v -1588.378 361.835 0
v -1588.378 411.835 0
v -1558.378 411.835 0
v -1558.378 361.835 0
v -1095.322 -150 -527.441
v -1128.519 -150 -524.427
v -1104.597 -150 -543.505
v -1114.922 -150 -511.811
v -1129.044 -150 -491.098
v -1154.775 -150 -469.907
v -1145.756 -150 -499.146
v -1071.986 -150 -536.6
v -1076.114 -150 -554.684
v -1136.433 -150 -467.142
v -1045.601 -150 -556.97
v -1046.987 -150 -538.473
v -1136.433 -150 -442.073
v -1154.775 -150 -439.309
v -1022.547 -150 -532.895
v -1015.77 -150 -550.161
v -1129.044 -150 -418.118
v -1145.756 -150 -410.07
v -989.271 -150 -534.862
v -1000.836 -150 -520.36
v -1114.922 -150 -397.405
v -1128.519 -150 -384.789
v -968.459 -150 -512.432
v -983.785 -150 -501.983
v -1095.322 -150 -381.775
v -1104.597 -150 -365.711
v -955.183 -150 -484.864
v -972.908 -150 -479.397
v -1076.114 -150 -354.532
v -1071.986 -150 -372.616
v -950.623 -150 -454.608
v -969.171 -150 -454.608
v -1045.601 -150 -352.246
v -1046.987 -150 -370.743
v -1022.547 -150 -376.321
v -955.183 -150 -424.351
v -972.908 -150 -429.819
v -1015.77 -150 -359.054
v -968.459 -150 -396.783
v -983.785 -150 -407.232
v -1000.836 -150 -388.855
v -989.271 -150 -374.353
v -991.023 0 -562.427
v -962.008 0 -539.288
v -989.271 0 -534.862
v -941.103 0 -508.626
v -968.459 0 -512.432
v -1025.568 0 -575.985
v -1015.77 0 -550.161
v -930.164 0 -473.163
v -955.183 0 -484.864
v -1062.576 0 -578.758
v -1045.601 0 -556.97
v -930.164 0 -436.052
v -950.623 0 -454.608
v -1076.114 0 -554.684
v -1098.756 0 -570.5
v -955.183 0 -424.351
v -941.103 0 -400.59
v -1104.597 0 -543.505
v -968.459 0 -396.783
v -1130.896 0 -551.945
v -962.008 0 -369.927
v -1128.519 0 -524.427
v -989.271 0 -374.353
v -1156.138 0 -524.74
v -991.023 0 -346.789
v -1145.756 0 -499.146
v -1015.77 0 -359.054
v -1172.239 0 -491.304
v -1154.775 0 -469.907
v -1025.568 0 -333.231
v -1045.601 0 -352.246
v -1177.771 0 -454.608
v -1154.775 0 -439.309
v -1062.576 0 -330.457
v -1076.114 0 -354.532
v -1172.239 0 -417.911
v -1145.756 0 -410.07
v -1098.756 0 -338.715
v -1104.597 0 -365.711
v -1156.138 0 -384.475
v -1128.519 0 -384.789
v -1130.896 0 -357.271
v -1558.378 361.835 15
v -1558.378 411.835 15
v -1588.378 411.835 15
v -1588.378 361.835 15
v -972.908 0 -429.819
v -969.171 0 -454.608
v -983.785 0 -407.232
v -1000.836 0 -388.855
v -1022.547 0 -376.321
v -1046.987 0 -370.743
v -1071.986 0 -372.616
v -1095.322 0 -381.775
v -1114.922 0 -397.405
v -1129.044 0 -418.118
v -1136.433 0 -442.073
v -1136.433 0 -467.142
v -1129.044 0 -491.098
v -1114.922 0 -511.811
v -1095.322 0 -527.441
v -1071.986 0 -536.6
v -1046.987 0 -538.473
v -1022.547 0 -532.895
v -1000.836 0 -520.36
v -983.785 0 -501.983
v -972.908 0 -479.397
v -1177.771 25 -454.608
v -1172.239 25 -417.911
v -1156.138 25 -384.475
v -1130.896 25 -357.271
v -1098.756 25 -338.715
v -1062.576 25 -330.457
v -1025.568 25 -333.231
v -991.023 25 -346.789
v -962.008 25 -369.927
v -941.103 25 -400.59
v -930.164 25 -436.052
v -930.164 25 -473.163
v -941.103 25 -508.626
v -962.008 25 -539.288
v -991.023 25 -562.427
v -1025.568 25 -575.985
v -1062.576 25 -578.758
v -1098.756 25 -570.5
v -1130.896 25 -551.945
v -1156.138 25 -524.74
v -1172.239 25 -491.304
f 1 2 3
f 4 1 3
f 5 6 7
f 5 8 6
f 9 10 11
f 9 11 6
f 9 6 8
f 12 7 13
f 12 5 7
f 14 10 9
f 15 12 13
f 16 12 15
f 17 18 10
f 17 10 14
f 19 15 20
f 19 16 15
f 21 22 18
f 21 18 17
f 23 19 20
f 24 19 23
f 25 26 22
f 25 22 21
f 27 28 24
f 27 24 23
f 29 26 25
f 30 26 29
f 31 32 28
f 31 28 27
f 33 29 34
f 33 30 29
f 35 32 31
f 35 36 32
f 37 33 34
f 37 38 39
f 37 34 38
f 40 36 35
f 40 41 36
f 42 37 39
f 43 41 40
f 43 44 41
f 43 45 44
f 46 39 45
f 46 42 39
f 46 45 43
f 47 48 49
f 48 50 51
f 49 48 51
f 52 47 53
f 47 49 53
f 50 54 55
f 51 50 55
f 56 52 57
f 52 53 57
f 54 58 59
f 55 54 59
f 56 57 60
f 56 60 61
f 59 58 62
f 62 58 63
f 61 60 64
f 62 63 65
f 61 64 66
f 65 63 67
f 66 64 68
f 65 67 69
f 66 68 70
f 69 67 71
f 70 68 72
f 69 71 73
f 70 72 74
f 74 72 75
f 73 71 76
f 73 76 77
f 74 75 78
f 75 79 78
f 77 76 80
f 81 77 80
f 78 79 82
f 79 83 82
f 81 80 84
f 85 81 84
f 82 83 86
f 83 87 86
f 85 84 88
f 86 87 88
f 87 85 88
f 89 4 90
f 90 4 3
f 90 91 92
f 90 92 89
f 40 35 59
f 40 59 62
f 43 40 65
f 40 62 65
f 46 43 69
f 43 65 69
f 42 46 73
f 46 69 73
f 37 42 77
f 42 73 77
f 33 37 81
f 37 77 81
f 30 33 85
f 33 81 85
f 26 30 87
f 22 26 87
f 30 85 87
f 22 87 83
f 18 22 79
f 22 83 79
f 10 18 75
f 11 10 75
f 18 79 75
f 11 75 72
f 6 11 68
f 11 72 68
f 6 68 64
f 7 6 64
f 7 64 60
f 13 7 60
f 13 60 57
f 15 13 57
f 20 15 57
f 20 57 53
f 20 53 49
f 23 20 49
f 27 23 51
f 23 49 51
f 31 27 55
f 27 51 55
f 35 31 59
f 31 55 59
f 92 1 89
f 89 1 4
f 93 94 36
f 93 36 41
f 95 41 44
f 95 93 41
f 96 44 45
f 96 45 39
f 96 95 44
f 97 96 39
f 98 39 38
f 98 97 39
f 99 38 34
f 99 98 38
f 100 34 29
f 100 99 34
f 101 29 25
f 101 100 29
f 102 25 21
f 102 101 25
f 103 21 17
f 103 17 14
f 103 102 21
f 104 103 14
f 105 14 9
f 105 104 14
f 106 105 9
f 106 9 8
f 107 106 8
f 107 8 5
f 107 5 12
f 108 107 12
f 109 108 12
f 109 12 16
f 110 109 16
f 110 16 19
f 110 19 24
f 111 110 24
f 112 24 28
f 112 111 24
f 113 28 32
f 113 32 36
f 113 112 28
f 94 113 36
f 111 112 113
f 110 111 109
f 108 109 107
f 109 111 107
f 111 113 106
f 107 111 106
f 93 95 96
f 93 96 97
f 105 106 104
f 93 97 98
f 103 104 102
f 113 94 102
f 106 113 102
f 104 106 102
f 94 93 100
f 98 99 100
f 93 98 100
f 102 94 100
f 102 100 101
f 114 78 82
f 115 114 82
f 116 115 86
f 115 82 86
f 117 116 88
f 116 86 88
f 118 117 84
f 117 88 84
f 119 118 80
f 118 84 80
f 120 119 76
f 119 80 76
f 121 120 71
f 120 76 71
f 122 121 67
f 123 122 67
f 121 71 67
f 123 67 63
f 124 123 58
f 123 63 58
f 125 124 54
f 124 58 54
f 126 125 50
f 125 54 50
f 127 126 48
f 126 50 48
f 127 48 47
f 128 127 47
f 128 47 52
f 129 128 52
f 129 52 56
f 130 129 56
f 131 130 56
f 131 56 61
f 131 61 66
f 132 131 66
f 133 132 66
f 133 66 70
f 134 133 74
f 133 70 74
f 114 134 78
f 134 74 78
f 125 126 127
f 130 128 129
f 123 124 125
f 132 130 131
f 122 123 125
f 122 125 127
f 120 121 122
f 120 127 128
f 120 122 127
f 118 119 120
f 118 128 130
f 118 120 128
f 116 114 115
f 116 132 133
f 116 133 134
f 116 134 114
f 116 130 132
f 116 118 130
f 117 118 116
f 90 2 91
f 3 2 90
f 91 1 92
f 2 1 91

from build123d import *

# Parameters (mm, degrees)
F0_W     = 30
F0_H     = 50
F1_DEPTH = 15
F2_R     = 102.6493082789
F2_R_2   = 84.1005190764
F3_DEPTH = 150
F4_R     = 124.4985615198
F4_R_2   = 102.6493082789
F4_R_3   = 84.1005190764
F5_DEPTH = 25


with BuildPart() as f1:
    # F0 (on Top) → F1 (new body)
    with BuildSketch(Plane.XY):
        with Locations((-1573.3778619766, 386.8347048759)):
            Rectangle(F0_W, F0_H)
    extrude(amount=F1_DEPTH)


with BuildPart() as f3:
    # F2 (on Front) → F3 (new body)
    with BuildSketch(Plane.XZ):
        with Locations((-1053.2720088959, -454.607874155)):
            Circle(F2_R)
        with Locations((-1053.2720088959, -454.607874155)):
            Circle(F2_R_2, mode=Mode.SUBTRACT)
    extrude(amount=F3_DEPTH)

    # F4 (on face) → F5 (join)
    with BuildSketch(Plane(origin=(0, 0, 0), x_dir=(-1, 0, 0), z_dir=(0, 1, 0))):
        with Locations((1053.2720088959, -454.607874155)):
            Circle(F4_R)
        with Locations((1053.2720088959, -454.607874155)):
            Circle(F4_R_2, mode=Mode.SUBTRACT)
        with Locations((1053.2720088959, -454.607874155)):
            Circle(F4_R_2)
        with Locations((1053.2720088959, -454.607874155)):
            Circle(F4_R_3, mode=Mode.SUBTRACT)
        with Locations((1053.2720088959, -454.607874155)):
            Circle(F4_R_3)
    extrude(amount=F5_DEPTH)


solid = Compound([f1.part, f3.part])
